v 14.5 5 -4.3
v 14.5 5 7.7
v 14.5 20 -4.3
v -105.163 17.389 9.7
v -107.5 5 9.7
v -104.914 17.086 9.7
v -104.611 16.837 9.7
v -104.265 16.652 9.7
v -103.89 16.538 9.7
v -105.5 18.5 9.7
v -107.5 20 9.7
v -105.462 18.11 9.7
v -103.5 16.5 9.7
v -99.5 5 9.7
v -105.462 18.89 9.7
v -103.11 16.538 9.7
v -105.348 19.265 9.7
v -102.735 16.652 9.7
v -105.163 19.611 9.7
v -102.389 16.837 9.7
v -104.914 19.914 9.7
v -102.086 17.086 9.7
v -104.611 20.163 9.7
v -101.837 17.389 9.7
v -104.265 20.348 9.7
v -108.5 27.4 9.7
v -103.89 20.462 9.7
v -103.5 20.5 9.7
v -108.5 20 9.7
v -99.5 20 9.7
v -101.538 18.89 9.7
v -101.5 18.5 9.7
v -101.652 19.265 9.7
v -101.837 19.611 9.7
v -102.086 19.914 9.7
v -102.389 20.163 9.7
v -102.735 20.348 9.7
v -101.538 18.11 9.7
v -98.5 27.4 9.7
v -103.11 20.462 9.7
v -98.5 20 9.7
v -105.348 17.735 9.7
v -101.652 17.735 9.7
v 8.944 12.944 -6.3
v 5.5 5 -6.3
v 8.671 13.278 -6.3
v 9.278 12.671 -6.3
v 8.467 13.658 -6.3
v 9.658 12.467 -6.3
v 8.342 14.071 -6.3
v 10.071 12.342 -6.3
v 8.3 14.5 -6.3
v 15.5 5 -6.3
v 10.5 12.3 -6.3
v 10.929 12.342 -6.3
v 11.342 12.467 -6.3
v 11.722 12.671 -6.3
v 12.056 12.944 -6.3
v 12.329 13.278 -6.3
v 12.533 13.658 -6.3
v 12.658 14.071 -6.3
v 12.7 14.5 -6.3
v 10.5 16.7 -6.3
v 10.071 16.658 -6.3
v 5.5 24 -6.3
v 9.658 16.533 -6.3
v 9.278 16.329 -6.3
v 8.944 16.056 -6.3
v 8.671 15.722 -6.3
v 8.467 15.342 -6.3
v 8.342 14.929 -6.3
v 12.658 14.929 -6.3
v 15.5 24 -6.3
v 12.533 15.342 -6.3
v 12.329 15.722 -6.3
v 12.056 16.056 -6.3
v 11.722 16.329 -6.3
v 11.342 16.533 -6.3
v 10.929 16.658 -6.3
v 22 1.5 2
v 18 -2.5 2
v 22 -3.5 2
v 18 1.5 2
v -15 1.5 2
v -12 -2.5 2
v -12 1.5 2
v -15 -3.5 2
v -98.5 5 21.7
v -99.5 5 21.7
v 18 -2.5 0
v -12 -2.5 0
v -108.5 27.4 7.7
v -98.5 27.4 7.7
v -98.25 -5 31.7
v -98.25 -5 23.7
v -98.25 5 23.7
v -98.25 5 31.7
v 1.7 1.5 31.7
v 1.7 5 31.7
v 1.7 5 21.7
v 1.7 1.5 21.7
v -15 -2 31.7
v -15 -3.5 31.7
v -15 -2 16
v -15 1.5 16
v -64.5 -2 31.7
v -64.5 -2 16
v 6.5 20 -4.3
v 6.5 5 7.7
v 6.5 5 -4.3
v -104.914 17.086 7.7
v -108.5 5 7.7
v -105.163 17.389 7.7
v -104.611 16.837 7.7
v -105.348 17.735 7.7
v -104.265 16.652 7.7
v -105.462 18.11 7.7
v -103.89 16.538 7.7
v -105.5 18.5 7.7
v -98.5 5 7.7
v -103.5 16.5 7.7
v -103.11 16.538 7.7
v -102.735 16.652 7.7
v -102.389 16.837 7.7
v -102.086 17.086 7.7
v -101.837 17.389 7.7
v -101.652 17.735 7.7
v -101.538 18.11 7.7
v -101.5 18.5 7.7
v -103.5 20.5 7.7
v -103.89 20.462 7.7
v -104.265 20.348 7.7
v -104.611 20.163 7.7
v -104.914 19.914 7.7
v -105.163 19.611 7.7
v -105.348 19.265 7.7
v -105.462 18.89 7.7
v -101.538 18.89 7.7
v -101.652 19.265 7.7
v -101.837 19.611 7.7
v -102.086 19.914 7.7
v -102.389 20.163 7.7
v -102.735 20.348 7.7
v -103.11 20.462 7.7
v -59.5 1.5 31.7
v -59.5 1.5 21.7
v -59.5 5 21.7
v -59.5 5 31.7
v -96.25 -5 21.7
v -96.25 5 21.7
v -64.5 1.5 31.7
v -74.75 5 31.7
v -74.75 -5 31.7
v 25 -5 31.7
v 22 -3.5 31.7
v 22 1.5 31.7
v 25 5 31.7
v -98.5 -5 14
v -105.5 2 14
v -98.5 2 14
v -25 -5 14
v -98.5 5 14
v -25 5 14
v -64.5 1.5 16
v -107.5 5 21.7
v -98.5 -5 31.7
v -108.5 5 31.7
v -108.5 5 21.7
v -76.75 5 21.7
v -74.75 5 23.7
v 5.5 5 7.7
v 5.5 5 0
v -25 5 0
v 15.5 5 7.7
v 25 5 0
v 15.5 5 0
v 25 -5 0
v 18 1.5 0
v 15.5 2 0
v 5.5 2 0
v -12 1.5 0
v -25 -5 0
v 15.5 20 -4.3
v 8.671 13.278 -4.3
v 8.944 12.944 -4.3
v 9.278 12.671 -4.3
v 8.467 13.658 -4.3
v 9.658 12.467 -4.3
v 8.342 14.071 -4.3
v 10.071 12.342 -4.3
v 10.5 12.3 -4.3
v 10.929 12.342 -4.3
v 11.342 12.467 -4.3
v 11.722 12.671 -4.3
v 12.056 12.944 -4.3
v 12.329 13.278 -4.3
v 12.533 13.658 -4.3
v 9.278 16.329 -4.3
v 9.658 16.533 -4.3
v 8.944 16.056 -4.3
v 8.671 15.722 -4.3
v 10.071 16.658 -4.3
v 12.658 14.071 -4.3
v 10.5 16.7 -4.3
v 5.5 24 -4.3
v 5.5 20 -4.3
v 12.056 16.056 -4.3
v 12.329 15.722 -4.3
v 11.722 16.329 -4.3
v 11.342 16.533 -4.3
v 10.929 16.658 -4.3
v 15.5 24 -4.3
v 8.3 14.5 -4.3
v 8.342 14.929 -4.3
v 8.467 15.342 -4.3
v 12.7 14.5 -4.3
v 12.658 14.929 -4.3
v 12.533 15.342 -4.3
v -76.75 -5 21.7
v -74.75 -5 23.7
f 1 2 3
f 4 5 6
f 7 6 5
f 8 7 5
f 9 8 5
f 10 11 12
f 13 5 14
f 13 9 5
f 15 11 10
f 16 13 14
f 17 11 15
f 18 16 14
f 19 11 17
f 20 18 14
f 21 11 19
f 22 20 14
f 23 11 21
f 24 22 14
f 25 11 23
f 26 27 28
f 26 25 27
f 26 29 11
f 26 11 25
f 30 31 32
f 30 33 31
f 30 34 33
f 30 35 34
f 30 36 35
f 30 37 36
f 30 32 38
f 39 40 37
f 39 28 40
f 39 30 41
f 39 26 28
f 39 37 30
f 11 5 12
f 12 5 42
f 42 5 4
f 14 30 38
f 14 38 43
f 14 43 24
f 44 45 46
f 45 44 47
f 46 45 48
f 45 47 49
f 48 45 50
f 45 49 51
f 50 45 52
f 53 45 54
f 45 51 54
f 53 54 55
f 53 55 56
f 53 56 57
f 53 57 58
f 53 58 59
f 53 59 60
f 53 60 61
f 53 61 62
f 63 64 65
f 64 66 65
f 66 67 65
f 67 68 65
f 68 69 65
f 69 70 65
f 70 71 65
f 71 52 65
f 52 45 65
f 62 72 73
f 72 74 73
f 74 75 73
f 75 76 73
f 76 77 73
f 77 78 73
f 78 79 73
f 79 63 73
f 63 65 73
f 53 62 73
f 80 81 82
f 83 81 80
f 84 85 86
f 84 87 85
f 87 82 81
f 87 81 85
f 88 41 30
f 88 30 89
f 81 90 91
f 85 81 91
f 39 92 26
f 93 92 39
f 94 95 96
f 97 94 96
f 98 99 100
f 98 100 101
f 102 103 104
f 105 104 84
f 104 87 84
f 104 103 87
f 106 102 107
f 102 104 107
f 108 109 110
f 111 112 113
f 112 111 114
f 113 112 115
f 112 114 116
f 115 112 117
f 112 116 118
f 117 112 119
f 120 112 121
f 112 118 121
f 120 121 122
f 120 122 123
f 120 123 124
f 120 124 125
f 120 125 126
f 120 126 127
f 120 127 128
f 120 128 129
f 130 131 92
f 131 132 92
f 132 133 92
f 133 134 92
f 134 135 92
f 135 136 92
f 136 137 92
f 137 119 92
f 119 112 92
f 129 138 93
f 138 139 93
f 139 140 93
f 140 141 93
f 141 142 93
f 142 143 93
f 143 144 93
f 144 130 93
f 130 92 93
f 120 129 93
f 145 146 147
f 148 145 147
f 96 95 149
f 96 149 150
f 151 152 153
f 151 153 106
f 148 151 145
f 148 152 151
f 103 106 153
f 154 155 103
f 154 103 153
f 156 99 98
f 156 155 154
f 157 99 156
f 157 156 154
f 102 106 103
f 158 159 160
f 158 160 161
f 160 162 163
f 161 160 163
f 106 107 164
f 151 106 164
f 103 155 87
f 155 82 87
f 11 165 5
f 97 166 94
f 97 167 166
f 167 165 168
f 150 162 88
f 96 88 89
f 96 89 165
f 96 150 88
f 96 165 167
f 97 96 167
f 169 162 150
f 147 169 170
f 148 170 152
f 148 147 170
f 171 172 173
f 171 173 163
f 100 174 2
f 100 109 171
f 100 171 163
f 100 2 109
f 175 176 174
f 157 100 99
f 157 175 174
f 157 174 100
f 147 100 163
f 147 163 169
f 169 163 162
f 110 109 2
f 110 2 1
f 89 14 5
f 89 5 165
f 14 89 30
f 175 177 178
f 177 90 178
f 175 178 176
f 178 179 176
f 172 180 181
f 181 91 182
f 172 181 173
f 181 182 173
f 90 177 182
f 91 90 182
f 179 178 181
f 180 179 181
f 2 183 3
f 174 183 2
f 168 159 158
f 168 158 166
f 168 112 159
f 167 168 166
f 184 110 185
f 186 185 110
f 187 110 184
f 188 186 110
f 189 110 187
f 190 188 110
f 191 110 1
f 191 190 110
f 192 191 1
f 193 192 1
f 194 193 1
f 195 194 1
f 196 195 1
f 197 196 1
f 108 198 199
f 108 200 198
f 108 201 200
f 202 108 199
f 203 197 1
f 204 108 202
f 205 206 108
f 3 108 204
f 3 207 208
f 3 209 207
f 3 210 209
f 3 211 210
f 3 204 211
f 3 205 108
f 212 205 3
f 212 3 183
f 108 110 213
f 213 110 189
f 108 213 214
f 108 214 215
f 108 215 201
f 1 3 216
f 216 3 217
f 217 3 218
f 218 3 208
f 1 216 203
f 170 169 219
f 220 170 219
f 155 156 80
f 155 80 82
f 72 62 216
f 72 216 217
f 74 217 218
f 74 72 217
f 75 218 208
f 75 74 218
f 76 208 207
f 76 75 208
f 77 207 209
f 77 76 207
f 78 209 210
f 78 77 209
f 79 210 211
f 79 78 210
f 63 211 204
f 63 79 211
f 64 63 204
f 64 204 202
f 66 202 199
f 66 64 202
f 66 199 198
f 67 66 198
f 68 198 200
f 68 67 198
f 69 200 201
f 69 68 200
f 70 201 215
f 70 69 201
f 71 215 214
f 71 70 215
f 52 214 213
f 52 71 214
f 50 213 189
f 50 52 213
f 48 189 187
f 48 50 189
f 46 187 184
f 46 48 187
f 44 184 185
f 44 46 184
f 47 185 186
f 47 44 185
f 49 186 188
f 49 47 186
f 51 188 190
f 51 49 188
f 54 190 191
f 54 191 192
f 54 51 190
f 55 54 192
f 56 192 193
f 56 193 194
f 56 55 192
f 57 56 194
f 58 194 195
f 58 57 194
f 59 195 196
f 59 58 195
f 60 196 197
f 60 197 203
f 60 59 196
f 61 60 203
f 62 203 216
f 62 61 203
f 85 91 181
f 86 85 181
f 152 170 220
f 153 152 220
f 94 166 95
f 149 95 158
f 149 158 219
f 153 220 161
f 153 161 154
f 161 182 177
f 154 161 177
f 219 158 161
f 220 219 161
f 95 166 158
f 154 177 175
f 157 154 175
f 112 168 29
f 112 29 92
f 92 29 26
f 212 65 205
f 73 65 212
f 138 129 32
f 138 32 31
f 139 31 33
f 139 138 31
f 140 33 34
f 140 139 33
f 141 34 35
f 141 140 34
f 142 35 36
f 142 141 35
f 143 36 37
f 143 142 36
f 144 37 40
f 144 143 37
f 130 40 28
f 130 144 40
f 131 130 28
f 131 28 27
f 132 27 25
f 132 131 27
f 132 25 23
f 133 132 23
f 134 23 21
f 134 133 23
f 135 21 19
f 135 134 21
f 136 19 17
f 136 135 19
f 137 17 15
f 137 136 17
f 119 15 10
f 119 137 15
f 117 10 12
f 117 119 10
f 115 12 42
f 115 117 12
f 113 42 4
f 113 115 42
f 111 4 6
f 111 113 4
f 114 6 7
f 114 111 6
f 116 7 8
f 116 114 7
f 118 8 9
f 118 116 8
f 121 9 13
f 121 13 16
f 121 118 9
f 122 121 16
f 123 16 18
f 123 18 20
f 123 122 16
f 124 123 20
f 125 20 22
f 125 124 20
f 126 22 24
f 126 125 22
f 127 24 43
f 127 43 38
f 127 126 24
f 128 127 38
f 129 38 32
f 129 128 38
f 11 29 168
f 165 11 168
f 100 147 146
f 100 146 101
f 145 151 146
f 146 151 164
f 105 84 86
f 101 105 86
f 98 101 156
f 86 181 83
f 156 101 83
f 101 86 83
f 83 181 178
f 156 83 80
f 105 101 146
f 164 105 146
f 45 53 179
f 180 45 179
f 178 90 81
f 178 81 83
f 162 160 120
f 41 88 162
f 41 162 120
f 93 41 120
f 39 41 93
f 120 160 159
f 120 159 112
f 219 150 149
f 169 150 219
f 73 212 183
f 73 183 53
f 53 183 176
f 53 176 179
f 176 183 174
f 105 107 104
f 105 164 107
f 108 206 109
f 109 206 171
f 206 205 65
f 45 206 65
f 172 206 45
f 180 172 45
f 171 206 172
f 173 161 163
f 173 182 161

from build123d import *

# Parameters (mm, degrees)
SKETCH1_W            = 10
SKETCH1_H            = 50
SKETCH1_W_2          = 4
SKETCH1_H_2          = 30
BOSS_EXTRUDE1_DEPTH  = 2
SKETCH2_W            = 50
SKETCH2_H            = 10
SKETCH2_W_2          = 37
SKETCH2_H_2          = 5
BOSS_EXTRUDE2_DEPTH  = 12
SKETCH6_W            = 133.5
SKETCH6_H            = 10
SKETCH6_W_2          = 37
SKETCH6_H_2          = 5
BOSS_EXTRUDE7_DEPTH  = 2
SKETCH3_W            = 133.5
SKETCH3_H            = 10
BOSS_EXTRUDE3_DEPTH  = 5.7
SKETCH4_W            = 10.25
SKETCH4_H            = 10
BOSS_EXTRUDE4_DEPTH  = 10
CHAMFER1_SIZE        = 2
BOSS_EXTRUDE5_START  = -38
SKETCH5_W            = 10
SKETCH5_H            = 19
SKETCH5_R            = 2.2
BOSS_EXTRUDE5_DEPTH  = 2
BOSS_EXTRUDE6_START  = -24
SKETCH5_3_W          = 10
SKETCH5_3_H          = 22.4
SKETCH5_3_R          = 2
BOSS_EXTRUDE6_DEPTH  = 2
BOSS_EXTRUDE8_DEPTH  = 1
BOSS_EXTRUDE9_START  = -10
BOSS_EXTRUDE9_DEPTH  = 1
BOSS_EXTRUDE10_DEPTH = 1
BOSS_EXTRUDE11_START = -10
BOSS_EXTRUDE11_DEPTH = 1
BOSS_EXTRUDE12_START = -9.5
BOSS_EXTRUDE12_DEPTH = 10
BOSS_EXTRUDE13_DEPTH = 10
CHAMFER2_SIZE        = 10


with BuildPart() as part:
    # Sketch1 → Boss-Extrude1 (new body)
    with BuildSketch(Plane(origin=(0, 0, 0), x_dir=(0, 1, 0), z_dir=(0, 0, 1))):
        Rectangle(SKETCH1_W, SKETCH1_H)
        with Locations((-0.5, -3)):
            Rectangle(SKETCH1_W_2, SKETCH1_H_2, mode=Mode.SUBTRACT)
    extrude(amount=BOSS_EXTRUDE1_DEPTH)

    # Sketch2 → Boss-Extrude2 (add)
    with BuildSketch(Plane.XY.offset(2)):
        Rectangle(SKETCH2_W, SKETCH2_H)
        with Locations((3.5, -1)):
            Rectangle(SKETCH2_W_2, SKETCH2_H_2, mode=Mode.SUBTRACT)
    extrude(amount=BOSS_EXTRUDE2_DEPTH)

    # Sketch6 → Boss-Extrude7 (add)
    with BuildSketch(Plane.XY.offset(14)):
        with Locations((-41.75, 0)):
            Rectangle(SKETCH6_W, SKETCH6_H)
        with Locations((3.5, -1)):
            Rectangle(SKETCH6_W_2, SKETCH6_H_2, mode=Mode.SUBTRACT)
    extrude(amount=BOSS_EXTRUDE7_DEPTH)

    # Sketch3 → Boss-Extrude3 (add)
    with BuildSketch(Plane.XY.offset(16)):
        with Locations((-41.75, 0)):
            Rectangle(SKETCH3_W, SKETCH3_H)
        Polygon((22, -3.5), (-15, -3.5), (-15, -2), (-64.5, -2), (-64.5, 1.5), (22, 1.5), align=None, mode=Mode.SUBTRACT)
    extrude(amount=BOSS_EXTRUDE3_DEPTH)

    # Sketch4 → Boss-Extrude4 (add)
    with BuildSketch(Plane.XY.offset(21.7)):
        with Locations((-103.375, 0)):
            Rectangle(SKETCH4_W, SKETCH4_H)
        Polygon((-64.5, -2), (-64.5, 1.5), (-59.5, 1.5), (-59.5, 5), (-74.75, 5), (-74.75, -5), (25, -5), (25, 5), (1.7, 5), (1.7, 1.5), (22, 1.5), (22, -3.5), (-15, -3.5), (-15, -2), align=None)
    extrude(amount=BOSS_EXTRUDE4_DEPTH)

    # Chamfer1
    chamfer1_edges = [part.edges().sort_by_distance(p)[0] for p in [
        (-98.25, 0, 21.7),
        (-74.75, 0, 21.7),
    ]]
    chamfer(chamfer1_edges, length=CHAMFER1_SIZE)



with BuildPart() as body_2:
    # Sketch5 → Boss-Extrude5 (new body)
    with BuildSketch(Plane.XY.offset(31.7).offset(BOSS_EXTRUDE5_START)):
        with Locations((10.5, 14.5)):
            Rectangle(SKETCH5_W, SKETCH5_H)
        with Locations((10.5, 14.5)):
            Circle(SKETCH5_R, mode=Mode.SUBTRACT)
    extrude(amount=BOSS_EXTRUDE5_DEPTH)


with BuildPart() as body_3:
    # Sketch5<3> → Boss-Extrude6 (new body)
    with BuildSketch(Plane.XY.offset(31.7).offset(BOSS_EXTRUDE6_START)):
        with Locations((-103.5, 16.2)):
            Rectangle(SKETCH5_3_W, SKETCH5_3_H)
        with Locations((-103.5, 18.5)):
            Circle(SKETCH5_3_R, mode=Mode.SUBTRACT)
    extrude(amount=BOSS_EXTRUDE6_DEPTH)


with BuildPart() as part_1:
    add(part.part)

    add(body_2.part)  # Boss-Extrude8 merges body 2
    # Sketch7 → Boss-Extrude8 (add)
    with BuildSketch(Plane.YZ.offset(15.5)):
        Polygon((5, -4.3), (20, -4.3), (5, 7.7), align=None)
    extrude(amount=-BOSS_EXTRUDE8_DEPTH)

    # Sketch7<2> → Boss-Extrude9 (add)
    with BuildSketch(Plane.YZ.offset(15.5).offset(BOSS_EXTRUDE9_START)):
        Polygon((5, -4.3), (20, -4.3), (5, 7.7), align=None)
    extrude(amount=BOSS_EXTRUDE9_DEPTH)


    add(body_3.part)  # Boss-Extrude10 merges body 3
    # Sketch8 → Boss-Extrude10 (add)
    with BuildSketch(Plane.YZ.offset(-98.5)):
        Polygon((5, 9.7), (20, 9.7), (5, 21.7), align=None)
    extrude(amount=-BOSS_EXTRUDE10_DEPTH)

    # Sketch8<2> → Boss-Extrude11 (add)
    with BuildSketch(Plane.YZ.offset(-98.5).offset(BOSS_EXTRUDE11_START)):
        Polygon((5, 9.7), (20, 9.7), (5, 21.7), align=None)
    extrude(amount=BOSS_EXTRUDE11_DEPTH)

    # Sketch9 → Boss-Extrude12 (add)
    with BuildSketch(Plane.YZ.offset(25).offset(BOSS_EXTRUDE12_START)):
        Polygon((5, -6.3), (2, 0), (5, 0), align=None)
    extrude(amount=-BOSS_EXTRUDE12_DEPTH)

    # Sketch10 → Boss-Extrude13 (add)
    with BuildSketch(Plane.YZ.offset(-98.5)):
        Polygon((5, 7.7), (5, 14), (2, 14), align=None)
    extrude(amount=-BOSS_EXTRUDE13_DEPTH)

    # Chamfer2
    chamfer2_edges = [part_1.edges().sort_by_distance(p)[0] for p in [
        (-108.5, -5, 22.85),
    ]]
    chamfer(chamfer2_edges, length=CHAMFER2_SIZE)


solid = part_1.part
